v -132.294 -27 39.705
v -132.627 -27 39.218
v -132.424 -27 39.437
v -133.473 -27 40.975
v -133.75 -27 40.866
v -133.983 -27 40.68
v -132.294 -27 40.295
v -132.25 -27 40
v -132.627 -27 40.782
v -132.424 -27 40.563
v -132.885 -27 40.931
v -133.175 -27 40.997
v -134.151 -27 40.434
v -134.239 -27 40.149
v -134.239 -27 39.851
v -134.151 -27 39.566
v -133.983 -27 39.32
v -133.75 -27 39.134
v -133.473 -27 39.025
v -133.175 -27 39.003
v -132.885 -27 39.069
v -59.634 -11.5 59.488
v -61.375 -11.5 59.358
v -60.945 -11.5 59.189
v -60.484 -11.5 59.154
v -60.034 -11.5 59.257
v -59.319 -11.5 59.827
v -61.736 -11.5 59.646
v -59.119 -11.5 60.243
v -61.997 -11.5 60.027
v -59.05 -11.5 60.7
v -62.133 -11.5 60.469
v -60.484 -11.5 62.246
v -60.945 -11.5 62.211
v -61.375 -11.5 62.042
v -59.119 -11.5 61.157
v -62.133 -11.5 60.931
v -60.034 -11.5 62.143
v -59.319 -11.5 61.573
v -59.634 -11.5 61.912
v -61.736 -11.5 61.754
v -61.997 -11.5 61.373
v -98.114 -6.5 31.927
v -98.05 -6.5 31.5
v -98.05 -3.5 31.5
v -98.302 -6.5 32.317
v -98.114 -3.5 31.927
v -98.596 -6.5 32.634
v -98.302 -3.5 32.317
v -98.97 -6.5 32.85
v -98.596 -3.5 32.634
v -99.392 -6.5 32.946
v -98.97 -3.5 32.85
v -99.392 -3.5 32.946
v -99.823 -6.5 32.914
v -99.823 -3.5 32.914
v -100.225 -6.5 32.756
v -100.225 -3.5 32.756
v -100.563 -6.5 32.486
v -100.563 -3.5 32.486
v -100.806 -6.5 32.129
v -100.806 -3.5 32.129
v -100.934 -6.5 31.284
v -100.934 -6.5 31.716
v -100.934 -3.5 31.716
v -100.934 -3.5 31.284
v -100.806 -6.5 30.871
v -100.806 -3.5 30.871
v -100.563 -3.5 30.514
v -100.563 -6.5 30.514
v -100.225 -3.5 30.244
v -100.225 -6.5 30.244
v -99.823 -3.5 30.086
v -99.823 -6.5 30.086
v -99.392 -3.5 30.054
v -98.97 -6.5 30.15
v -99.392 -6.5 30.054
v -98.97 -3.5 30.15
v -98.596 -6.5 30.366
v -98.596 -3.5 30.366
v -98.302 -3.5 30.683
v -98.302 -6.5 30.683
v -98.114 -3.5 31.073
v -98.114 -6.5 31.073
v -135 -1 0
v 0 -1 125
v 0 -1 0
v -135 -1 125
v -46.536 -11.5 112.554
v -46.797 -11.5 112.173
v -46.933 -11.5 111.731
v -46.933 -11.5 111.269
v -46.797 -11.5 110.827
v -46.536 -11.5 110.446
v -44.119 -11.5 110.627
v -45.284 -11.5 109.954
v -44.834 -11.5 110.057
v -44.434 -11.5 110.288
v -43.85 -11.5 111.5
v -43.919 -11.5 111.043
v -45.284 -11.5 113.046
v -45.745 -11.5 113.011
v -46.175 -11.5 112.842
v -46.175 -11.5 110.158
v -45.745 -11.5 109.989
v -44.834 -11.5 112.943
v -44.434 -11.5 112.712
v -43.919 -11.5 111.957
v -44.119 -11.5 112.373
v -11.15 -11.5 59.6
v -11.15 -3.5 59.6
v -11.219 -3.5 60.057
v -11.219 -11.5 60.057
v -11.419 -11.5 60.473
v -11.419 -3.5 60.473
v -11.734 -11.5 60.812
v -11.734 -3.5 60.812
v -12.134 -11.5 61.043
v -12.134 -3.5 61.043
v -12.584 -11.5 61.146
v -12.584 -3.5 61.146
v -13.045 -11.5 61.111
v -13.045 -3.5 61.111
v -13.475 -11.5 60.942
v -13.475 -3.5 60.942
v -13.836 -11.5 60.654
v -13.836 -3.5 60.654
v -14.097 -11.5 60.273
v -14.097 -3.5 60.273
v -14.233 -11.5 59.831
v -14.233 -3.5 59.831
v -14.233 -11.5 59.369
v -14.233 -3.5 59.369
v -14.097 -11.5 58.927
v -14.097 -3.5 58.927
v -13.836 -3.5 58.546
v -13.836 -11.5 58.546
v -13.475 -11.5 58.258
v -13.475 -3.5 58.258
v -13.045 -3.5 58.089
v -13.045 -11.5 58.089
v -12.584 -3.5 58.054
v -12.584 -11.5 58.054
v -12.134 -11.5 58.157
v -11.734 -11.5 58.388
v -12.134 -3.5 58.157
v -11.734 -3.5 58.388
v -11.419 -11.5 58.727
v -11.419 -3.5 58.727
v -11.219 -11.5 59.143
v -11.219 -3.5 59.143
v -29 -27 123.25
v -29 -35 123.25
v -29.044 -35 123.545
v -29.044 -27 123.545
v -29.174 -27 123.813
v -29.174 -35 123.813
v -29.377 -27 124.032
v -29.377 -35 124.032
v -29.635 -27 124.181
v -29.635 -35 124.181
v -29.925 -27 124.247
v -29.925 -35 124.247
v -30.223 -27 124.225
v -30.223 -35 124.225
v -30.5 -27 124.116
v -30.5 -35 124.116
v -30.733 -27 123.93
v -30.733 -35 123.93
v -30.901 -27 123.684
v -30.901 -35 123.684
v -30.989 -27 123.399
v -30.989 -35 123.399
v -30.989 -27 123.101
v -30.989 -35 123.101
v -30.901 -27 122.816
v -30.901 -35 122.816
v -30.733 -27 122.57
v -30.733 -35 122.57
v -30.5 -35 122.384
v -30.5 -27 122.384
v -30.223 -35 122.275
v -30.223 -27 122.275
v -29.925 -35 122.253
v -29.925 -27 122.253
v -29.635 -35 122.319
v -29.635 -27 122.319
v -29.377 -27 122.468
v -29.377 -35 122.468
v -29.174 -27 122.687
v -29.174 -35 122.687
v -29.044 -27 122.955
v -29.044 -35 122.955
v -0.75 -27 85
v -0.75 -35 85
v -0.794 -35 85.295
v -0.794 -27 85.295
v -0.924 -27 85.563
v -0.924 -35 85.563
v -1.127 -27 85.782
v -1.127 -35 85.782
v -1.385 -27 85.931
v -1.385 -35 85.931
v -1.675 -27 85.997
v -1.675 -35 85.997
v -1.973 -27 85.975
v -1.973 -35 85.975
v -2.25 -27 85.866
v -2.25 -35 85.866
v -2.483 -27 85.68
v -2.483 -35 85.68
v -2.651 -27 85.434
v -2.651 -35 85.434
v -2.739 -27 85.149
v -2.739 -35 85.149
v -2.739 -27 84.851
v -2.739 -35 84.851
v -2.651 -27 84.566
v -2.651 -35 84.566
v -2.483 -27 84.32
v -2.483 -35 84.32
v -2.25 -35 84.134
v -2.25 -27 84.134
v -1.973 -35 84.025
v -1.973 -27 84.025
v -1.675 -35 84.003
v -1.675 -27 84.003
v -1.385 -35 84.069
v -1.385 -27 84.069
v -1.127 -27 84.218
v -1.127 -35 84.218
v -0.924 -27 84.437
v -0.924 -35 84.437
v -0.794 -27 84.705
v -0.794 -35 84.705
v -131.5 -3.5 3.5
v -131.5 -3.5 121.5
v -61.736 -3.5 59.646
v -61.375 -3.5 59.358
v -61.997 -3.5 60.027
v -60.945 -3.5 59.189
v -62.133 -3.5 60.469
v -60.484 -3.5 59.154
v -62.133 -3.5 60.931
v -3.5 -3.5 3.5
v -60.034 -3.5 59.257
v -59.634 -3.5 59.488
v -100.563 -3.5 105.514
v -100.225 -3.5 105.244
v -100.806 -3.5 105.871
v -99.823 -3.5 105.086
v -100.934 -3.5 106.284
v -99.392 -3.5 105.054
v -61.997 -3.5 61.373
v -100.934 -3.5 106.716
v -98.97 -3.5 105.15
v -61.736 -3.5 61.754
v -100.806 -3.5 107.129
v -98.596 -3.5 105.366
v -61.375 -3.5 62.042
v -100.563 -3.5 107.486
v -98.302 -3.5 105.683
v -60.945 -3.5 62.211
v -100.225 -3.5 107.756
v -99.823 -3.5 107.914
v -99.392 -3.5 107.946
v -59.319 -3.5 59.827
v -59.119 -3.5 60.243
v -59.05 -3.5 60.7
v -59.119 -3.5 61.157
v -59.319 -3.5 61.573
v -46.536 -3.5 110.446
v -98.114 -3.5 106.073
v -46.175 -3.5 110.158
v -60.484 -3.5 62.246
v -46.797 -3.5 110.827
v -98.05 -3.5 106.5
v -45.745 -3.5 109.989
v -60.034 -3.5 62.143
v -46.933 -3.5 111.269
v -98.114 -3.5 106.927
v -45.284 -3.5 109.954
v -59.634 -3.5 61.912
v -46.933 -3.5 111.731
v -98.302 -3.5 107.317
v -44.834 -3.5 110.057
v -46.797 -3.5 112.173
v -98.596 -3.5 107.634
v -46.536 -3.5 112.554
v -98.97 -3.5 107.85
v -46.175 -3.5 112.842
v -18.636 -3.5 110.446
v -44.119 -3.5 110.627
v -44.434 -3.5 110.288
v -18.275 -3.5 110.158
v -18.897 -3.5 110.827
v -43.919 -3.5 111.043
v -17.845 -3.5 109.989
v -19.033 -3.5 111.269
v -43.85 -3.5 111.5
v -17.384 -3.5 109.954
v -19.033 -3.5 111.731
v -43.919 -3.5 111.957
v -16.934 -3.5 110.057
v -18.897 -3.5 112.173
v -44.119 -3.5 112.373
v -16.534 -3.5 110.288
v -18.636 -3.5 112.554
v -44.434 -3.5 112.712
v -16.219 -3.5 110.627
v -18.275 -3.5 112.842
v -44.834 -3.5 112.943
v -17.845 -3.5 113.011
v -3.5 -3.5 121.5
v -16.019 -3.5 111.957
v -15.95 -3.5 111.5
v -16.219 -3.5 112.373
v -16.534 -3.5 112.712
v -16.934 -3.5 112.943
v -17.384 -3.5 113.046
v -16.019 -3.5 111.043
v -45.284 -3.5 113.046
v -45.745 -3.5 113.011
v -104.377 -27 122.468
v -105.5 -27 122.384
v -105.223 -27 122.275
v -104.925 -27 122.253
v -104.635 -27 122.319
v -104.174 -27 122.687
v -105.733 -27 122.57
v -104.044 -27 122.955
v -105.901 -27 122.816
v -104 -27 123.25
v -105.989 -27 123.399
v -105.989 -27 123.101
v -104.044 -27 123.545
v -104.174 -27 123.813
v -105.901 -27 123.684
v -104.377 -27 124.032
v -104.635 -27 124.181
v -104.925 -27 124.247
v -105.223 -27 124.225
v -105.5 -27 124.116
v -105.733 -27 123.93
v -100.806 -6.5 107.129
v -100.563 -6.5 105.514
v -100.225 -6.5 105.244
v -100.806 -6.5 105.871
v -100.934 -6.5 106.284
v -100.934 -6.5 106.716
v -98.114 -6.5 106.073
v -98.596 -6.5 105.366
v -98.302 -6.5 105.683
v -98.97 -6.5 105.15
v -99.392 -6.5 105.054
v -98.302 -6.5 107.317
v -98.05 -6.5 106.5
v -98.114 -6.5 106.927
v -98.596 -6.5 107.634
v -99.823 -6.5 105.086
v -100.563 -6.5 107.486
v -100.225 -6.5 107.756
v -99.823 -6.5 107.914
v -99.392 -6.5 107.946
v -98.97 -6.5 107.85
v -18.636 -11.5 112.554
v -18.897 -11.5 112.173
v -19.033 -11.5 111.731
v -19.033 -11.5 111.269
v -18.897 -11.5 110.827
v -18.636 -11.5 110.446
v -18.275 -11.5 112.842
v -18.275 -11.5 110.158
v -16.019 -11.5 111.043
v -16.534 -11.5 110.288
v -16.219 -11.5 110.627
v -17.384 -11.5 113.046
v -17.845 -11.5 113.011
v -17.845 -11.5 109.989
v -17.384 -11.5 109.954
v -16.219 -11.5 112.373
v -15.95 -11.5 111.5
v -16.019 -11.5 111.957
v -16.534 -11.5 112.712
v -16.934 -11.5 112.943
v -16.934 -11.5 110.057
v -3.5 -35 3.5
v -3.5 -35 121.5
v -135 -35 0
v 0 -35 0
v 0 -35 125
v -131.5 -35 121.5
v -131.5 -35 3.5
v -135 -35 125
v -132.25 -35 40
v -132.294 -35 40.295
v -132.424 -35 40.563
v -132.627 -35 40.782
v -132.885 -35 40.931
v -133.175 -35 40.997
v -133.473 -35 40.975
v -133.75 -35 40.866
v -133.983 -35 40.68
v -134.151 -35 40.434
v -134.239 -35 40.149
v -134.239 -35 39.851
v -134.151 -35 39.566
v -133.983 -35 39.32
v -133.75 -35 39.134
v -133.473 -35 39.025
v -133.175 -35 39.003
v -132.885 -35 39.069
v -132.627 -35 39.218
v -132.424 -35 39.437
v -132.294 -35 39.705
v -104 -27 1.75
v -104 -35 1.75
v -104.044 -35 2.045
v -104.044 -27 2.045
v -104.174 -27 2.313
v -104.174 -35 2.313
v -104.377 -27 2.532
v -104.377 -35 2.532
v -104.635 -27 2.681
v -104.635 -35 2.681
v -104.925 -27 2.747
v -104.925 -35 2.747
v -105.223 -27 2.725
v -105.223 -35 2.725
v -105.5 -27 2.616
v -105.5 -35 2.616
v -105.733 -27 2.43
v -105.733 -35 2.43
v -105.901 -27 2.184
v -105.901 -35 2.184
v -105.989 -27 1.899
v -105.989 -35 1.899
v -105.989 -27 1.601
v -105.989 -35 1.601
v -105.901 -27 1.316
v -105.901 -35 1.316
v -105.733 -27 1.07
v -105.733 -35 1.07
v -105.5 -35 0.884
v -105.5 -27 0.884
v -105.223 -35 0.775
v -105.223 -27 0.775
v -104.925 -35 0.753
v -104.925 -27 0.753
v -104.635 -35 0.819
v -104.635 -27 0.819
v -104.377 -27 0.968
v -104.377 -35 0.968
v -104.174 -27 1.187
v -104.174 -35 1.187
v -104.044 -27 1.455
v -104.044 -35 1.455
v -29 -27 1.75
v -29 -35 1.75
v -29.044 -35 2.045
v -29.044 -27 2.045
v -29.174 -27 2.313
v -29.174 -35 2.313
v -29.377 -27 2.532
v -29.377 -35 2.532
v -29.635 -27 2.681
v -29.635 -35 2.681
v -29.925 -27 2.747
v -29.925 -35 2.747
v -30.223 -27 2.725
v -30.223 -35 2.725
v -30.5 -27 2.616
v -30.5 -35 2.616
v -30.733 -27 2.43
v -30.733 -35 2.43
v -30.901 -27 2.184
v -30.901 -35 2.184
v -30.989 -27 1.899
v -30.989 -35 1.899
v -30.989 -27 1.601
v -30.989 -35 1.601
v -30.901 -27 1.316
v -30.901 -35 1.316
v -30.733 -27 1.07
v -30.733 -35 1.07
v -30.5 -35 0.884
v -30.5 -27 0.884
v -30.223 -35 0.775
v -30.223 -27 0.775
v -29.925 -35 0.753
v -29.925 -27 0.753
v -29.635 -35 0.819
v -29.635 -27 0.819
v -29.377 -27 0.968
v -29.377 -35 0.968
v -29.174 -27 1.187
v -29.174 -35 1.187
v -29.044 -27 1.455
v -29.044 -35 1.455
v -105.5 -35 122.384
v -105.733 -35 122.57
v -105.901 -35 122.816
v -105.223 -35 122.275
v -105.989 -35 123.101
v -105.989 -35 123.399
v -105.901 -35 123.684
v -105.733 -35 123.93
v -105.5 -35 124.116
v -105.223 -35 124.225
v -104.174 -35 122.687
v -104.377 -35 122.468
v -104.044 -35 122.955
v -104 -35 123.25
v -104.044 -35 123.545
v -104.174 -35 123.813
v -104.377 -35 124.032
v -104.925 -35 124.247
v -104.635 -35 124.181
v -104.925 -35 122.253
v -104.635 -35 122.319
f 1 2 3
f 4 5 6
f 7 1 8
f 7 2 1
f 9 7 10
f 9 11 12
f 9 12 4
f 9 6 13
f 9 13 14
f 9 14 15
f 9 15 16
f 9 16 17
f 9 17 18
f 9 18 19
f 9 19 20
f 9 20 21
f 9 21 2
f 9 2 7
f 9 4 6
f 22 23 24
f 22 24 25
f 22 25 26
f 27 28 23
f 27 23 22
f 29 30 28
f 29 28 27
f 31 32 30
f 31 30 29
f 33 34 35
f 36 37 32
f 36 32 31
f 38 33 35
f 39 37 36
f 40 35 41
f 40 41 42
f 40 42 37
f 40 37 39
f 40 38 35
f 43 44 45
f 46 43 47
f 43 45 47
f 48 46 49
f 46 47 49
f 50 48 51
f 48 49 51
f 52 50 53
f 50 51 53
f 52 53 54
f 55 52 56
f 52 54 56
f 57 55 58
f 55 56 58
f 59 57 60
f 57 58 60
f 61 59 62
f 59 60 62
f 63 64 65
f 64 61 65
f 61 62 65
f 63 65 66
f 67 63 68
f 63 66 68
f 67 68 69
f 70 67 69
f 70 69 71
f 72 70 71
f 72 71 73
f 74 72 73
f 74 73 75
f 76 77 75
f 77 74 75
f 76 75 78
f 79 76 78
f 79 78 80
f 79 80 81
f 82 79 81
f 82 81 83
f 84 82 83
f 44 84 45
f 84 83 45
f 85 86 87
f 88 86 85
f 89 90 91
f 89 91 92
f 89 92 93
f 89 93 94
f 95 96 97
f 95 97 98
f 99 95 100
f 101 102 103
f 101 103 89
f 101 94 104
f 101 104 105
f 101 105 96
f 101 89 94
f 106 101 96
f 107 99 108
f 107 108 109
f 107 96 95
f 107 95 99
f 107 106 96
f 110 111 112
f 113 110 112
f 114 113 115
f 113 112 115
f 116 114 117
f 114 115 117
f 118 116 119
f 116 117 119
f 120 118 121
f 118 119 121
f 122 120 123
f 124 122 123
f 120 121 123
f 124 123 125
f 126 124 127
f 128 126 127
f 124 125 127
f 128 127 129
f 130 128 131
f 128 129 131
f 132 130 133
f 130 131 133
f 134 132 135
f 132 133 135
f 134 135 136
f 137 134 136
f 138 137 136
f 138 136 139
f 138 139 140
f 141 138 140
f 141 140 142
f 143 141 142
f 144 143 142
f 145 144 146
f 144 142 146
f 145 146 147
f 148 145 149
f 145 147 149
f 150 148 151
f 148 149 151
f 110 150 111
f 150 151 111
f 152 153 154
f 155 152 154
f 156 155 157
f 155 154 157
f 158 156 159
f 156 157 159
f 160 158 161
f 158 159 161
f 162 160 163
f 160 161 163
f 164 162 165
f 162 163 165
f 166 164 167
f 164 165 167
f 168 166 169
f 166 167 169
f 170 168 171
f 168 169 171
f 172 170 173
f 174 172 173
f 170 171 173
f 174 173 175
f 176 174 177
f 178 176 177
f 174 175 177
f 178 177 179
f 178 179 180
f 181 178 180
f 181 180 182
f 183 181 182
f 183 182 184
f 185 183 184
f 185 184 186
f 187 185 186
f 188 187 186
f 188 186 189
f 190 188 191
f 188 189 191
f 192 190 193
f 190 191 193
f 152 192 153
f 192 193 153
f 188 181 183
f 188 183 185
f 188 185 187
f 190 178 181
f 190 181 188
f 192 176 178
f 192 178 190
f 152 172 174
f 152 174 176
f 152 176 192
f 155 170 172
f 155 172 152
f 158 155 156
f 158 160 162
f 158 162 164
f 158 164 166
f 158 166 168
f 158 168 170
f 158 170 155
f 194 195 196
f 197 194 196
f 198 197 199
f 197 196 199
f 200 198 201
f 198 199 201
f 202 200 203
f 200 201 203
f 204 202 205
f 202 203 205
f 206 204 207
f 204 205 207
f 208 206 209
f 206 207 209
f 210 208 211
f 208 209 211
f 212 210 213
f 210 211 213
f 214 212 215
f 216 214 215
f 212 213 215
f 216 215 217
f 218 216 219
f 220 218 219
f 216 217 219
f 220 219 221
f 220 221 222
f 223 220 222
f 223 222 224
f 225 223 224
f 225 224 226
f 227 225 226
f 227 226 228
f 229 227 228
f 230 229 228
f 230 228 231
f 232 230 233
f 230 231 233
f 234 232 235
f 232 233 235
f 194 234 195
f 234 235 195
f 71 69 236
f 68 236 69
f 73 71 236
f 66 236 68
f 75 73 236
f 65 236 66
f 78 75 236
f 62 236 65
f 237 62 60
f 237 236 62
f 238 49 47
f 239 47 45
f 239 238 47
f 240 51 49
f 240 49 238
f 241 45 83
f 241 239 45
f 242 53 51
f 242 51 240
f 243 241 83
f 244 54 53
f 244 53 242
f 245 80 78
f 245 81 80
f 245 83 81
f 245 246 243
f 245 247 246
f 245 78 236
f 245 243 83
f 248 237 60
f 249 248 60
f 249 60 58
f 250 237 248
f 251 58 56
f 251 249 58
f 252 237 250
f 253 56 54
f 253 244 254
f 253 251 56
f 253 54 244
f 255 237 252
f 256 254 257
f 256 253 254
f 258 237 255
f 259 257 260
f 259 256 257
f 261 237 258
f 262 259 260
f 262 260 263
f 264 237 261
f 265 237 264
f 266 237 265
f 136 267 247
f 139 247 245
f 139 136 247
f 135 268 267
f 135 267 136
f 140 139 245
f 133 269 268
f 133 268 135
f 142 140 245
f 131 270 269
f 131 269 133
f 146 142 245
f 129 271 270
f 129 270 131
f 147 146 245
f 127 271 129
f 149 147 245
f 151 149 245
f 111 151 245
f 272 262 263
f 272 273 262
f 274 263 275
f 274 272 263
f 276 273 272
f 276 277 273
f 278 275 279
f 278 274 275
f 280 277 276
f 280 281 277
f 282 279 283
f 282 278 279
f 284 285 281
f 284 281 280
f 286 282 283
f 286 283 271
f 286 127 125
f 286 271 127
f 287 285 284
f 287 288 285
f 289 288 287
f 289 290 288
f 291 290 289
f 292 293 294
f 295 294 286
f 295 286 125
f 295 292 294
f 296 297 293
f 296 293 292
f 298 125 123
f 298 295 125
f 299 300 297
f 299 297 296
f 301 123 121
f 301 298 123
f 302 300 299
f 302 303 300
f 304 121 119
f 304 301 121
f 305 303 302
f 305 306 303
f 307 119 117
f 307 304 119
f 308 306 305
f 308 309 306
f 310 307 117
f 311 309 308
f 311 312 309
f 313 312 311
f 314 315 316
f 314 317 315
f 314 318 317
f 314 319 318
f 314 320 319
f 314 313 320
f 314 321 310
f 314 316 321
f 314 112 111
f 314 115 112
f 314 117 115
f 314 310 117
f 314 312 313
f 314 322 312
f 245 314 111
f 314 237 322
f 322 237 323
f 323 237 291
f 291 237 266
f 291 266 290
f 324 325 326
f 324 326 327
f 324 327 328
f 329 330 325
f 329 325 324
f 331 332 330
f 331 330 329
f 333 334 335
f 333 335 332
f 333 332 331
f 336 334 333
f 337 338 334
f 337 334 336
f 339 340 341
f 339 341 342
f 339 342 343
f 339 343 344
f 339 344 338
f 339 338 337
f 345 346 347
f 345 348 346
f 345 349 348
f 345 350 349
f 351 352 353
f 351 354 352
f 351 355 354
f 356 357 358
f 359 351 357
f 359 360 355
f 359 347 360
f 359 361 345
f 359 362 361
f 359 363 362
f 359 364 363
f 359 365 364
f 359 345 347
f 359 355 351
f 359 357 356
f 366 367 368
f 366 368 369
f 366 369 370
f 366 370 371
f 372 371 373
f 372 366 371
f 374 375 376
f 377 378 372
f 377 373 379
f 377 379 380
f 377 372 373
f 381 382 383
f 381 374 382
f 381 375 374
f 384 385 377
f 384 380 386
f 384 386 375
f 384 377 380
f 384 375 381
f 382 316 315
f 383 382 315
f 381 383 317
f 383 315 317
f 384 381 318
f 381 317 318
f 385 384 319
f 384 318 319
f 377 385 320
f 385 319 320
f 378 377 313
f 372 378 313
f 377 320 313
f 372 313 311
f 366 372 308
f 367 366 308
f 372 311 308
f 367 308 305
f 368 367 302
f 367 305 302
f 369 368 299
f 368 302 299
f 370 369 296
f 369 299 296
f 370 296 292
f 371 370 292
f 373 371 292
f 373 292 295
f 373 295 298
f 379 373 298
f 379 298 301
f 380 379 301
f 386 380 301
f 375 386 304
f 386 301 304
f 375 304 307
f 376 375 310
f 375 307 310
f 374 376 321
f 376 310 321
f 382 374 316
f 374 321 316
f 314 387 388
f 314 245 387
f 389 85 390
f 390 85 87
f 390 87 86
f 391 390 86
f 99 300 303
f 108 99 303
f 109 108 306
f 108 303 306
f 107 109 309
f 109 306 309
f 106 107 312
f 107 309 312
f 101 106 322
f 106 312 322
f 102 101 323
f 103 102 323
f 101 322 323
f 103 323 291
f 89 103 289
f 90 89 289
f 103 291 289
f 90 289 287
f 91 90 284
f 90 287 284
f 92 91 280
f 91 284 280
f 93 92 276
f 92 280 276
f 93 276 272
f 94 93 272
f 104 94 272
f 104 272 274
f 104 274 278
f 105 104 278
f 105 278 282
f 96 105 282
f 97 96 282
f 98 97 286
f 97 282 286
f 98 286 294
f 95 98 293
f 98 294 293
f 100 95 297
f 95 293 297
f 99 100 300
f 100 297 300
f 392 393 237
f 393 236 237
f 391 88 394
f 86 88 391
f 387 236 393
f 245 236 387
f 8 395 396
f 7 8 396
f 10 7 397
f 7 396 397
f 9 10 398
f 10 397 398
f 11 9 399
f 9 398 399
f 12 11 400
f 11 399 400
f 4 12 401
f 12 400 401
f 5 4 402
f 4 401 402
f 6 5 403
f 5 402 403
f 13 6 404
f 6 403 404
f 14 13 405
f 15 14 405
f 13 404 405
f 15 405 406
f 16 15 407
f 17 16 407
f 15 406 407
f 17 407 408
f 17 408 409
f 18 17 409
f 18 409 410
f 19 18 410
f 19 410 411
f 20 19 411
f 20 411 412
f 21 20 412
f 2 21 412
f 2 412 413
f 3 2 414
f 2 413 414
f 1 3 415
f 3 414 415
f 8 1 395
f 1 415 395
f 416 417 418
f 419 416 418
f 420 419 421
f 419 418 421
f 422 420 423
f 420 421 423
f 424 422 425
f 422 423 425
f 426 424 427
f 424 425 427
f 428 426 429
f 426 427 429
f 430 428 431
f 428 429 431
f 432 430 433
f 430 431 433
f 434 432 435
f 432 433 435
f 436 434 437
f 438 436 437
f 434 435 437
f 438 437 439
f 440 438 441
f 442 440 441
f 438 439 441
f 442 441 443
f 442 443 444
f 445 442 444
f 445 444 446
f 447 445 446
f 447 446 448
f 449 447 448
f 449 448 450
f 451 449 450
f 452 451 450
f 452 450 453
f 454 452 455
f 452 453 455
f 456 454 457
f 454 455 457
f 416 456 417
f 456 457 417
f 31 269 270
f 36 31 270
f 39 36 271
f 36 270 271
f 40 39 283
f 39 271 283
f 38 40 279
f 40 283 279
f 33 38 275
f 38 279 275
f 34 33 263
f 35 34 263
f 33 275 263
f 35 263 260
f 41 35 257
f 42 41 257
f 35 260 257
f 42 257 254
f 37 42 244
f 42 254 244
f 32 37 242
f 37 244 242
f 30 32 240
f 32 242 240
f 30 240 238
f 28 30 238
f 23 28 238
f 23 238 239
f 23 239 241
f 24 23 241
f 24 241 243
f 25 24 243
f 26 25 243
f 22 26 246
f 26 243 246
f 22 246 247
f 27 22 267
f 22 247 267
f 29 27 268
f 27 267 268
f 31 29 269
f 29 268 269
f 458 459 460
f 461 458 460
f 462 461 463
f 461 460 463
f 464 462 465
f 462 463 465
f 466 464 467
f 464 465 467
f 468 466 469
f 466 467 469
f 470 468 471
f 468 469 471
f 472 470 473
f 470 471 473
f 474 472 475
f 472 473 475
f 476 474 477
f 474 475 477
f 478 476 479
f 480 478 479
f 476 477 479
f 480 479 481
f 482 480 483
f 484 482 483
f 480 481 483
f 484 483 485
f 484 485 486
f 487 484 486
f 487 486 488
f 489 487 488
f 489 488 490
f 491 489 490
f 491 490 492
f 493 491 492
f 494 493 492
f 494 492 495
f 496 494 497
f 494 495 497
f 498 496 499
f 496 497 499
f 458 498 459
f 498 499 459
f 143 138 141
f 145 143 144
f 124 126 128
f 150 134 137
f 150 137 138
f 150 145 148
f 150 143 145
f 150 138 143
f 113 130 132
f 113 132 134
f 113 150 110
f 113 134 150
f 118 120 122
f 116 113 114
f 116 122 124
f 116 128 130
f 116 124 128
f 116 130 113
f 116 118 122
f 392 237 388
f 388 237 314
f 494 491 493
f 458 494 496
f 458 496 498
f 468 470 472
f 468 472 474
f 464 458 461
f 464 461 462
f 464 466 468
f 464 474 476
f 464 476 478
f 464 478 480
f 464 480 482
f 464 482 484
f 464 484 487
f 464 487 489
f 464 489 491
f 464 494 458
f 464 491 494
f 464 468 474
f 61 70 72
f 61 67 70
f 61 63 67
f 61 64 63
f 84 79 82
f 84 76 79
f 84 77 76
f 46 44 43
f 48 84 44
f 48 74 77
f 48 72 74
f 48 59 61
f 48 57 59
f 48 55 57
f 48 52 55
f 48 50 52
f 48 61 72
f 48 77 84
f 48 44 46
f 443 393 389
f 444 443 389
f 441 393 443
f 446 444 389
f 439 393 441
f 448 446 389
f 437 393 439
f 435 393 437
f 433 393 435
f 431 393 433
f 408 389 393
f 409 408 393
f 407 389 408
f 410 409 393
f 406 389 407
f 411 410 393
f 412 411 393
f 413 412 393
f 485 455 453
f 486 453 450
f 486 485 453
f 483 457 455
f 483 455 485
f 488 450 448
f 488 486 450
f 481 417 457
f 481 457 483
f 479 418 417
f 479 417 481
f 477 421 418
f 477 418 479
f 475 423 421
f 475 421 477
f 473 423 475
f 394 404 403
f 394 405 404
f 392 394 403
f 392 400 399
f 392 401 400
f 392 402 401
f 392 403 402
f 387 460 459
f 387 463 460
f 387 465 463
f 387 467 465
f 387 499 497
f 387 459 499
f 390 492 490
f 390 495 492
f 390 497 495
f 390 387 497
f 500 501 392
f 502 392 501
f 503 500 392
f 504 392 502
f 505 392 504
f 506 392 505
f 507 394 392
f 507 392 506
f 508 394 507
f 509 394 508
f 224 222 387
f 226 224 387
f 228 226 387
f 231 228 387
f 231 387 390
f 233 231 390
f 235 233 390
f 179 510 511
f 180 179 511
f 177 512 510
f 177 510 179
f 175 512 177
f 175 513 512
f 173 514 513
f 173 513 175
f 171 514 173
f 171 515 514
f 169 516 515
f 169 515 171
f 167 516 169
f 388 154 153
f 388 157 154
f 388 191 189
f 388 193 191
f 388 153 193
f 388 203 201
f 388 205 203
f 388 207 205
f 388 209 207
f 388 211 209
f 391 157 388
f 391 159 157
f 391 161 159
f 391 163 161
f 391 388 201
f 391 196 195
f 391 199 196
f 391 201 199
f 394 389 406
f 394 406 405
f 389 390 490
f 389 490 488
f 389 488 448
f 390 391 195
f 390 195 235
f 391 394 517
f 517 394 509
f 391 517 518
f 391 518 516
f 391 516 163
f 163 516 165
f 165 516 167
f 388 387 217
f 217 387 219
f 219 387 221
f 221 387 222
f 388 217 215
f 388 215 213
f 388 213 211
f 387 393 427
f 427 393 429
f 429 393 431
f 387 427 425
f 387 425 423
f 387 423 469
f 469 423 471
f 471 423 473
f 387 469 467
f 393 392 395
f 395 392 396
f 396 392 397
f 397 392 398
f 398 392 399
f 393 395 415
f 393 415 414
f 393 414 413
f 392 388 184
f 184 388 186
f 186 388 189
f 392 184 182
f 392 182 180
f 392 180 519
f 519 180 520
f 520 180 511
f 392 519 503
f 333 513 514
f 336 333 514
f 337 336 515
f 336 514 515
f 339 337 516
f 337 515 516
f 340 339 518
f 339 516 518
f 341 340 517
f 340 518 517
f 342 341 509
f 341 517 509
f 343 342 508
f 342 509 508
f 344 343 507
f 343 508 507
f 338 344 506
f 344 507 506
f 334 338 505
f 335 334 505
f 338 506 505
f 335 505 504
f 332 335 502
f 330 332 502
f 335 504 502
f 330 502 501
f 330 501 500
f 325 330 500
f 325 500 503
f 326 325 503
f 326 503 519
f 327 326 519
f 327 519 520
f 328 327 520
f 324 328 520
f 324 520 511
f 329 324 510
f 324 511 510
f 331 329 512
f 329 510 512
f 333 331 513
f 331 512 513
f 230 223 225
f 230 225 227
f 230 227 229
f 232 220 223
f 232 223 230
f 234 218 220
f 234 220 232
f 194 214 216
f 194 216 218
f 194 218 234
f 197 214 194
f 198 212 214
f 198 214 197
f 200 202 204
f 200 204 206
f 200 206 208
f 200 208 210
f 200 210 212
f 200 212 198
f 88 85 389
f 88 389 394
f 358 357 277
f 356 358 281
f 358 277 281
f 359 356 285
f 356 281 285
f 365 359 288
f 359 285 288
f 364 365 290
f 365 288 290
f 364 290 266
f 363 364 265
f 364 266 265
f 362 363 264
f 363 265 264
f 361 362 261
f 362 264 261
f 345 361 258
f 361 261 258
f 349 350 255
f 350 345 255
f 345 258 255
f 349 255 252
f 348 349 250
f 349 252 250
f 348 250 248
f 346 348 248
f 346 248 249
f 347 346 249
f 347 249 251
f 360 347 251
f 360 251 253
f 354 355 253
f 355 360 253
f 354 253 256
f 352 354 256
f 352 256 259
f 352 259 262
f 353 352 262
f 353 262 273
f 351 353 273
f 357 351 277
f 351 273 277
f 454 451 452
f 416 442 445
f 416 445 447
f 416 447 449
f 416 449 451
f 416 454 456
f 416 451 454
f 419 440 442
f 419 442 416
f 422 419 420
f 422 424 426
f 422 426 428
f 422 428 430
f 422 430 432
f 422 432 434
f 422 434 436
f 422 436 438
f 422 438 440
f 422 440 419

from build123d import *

# Parameters (mm, degrees)
F0_W      = 135
F0_H      = 125
F1_DEPTH  = 35
F2_T      = -3.5
F3_R      = 1.45
F3_R_2    = 1.55
F4_DEPTH  = 8
F5_R      = 1
F6_DEPTH  = 8
F7_W      = 135
F7_H      = 125
F8_DEPTH  = 1
F9_R      = 1.830023
F10_DEPTH = 5
F11_R     = 2.785388
F12_DEPTH = 5


with BuildPart() as f1:
    # F0 (on Front) → F1 (new body)
    with BuildSketch(Plane.XZ):
        with Locations((-67.5, 62.5)):
            Rectangle(F0_W, F0_H)
    extrude(amount=F1_DEPTH)

    # F2
    f2_openings = [f1.faces().sort_by_distance(p)[0] for p in [
        (-67.5, -35, 62.5),
    ]]
    offset(amount=F2_T, openings=f2_openings)

    # F3 (on face) → F4 (join)
    with BuildSketch(Plane.XZ.offset(3.5)):
        with Locations((-99.5, 106.5)):
            Circle(F3_R)
        with Locations((-99.5, 31.5)):
            Circle(F3_R)
        with Locations((-45.4, 111.5)):
            Circle(F3_R_2)
        with Locations((-17.5, 111.5)):
            Circle(F3_R_2)
        with Locations((-12.7, 59.6)):
            Circle(F3_R_2)
        with Locations((-60.6, 60.7)):
            Circle(F3_R_2)
    extrude(amount=F4_DEPTH)

    # F5 (on face) → F6 (cut)
    with BuildSketch(Plane.XZ.offset(35)):
        with Locations((-30, 123.25)):
            Circle(F5_R)
        with Locations((-1.75, 85)):
            Circle(F5_R)
        with Locations((-30, 1.75)):
            Circle(F5_R)
        with Locations((-105, 1.75)):
            Circle(F5_R)
        with Locations((-133.25, 40)):
            Circle(F5_R)
        with Locations((-105, 123.25)):
            Circle(F5_R)
    extrude(amount=-F6_DEPTH, mode=Mode.SUBTRACT)

    # F7 (on face) → F8 (cut)
    with BuildSketch(Plane(origin=(0, 0, 0), x_dir=(-1, 0, 0), z_dir=(0, 1, 0))):
        with Locations((67.5, 62.5)):
            Rectangle(F7_W, F7_H)
    extrude(amount=-F8_DEPTH, mode=Mode.SUBTRACT)

    # F9 (on face) → F10 (cut)
    with BuildSketch(Plane.XZ.offset(11.5)):
        with Locations((-99.5, 106.5)):
            Circle(F9_R)
    extrude(amount=-F10_DEPTH, mode=Mode.SUBTRACT)

    # F11 (on face) → F12 (cut)
    with BuildSketch(Plane.XZ.offset(11.5)):
        with Locations((-99.5, 31.5)):
            Circle(F11_R)
    extrude(amount=-F12_DEPTH, mode=Mode.SUBTRACT)


solid = f1.part
